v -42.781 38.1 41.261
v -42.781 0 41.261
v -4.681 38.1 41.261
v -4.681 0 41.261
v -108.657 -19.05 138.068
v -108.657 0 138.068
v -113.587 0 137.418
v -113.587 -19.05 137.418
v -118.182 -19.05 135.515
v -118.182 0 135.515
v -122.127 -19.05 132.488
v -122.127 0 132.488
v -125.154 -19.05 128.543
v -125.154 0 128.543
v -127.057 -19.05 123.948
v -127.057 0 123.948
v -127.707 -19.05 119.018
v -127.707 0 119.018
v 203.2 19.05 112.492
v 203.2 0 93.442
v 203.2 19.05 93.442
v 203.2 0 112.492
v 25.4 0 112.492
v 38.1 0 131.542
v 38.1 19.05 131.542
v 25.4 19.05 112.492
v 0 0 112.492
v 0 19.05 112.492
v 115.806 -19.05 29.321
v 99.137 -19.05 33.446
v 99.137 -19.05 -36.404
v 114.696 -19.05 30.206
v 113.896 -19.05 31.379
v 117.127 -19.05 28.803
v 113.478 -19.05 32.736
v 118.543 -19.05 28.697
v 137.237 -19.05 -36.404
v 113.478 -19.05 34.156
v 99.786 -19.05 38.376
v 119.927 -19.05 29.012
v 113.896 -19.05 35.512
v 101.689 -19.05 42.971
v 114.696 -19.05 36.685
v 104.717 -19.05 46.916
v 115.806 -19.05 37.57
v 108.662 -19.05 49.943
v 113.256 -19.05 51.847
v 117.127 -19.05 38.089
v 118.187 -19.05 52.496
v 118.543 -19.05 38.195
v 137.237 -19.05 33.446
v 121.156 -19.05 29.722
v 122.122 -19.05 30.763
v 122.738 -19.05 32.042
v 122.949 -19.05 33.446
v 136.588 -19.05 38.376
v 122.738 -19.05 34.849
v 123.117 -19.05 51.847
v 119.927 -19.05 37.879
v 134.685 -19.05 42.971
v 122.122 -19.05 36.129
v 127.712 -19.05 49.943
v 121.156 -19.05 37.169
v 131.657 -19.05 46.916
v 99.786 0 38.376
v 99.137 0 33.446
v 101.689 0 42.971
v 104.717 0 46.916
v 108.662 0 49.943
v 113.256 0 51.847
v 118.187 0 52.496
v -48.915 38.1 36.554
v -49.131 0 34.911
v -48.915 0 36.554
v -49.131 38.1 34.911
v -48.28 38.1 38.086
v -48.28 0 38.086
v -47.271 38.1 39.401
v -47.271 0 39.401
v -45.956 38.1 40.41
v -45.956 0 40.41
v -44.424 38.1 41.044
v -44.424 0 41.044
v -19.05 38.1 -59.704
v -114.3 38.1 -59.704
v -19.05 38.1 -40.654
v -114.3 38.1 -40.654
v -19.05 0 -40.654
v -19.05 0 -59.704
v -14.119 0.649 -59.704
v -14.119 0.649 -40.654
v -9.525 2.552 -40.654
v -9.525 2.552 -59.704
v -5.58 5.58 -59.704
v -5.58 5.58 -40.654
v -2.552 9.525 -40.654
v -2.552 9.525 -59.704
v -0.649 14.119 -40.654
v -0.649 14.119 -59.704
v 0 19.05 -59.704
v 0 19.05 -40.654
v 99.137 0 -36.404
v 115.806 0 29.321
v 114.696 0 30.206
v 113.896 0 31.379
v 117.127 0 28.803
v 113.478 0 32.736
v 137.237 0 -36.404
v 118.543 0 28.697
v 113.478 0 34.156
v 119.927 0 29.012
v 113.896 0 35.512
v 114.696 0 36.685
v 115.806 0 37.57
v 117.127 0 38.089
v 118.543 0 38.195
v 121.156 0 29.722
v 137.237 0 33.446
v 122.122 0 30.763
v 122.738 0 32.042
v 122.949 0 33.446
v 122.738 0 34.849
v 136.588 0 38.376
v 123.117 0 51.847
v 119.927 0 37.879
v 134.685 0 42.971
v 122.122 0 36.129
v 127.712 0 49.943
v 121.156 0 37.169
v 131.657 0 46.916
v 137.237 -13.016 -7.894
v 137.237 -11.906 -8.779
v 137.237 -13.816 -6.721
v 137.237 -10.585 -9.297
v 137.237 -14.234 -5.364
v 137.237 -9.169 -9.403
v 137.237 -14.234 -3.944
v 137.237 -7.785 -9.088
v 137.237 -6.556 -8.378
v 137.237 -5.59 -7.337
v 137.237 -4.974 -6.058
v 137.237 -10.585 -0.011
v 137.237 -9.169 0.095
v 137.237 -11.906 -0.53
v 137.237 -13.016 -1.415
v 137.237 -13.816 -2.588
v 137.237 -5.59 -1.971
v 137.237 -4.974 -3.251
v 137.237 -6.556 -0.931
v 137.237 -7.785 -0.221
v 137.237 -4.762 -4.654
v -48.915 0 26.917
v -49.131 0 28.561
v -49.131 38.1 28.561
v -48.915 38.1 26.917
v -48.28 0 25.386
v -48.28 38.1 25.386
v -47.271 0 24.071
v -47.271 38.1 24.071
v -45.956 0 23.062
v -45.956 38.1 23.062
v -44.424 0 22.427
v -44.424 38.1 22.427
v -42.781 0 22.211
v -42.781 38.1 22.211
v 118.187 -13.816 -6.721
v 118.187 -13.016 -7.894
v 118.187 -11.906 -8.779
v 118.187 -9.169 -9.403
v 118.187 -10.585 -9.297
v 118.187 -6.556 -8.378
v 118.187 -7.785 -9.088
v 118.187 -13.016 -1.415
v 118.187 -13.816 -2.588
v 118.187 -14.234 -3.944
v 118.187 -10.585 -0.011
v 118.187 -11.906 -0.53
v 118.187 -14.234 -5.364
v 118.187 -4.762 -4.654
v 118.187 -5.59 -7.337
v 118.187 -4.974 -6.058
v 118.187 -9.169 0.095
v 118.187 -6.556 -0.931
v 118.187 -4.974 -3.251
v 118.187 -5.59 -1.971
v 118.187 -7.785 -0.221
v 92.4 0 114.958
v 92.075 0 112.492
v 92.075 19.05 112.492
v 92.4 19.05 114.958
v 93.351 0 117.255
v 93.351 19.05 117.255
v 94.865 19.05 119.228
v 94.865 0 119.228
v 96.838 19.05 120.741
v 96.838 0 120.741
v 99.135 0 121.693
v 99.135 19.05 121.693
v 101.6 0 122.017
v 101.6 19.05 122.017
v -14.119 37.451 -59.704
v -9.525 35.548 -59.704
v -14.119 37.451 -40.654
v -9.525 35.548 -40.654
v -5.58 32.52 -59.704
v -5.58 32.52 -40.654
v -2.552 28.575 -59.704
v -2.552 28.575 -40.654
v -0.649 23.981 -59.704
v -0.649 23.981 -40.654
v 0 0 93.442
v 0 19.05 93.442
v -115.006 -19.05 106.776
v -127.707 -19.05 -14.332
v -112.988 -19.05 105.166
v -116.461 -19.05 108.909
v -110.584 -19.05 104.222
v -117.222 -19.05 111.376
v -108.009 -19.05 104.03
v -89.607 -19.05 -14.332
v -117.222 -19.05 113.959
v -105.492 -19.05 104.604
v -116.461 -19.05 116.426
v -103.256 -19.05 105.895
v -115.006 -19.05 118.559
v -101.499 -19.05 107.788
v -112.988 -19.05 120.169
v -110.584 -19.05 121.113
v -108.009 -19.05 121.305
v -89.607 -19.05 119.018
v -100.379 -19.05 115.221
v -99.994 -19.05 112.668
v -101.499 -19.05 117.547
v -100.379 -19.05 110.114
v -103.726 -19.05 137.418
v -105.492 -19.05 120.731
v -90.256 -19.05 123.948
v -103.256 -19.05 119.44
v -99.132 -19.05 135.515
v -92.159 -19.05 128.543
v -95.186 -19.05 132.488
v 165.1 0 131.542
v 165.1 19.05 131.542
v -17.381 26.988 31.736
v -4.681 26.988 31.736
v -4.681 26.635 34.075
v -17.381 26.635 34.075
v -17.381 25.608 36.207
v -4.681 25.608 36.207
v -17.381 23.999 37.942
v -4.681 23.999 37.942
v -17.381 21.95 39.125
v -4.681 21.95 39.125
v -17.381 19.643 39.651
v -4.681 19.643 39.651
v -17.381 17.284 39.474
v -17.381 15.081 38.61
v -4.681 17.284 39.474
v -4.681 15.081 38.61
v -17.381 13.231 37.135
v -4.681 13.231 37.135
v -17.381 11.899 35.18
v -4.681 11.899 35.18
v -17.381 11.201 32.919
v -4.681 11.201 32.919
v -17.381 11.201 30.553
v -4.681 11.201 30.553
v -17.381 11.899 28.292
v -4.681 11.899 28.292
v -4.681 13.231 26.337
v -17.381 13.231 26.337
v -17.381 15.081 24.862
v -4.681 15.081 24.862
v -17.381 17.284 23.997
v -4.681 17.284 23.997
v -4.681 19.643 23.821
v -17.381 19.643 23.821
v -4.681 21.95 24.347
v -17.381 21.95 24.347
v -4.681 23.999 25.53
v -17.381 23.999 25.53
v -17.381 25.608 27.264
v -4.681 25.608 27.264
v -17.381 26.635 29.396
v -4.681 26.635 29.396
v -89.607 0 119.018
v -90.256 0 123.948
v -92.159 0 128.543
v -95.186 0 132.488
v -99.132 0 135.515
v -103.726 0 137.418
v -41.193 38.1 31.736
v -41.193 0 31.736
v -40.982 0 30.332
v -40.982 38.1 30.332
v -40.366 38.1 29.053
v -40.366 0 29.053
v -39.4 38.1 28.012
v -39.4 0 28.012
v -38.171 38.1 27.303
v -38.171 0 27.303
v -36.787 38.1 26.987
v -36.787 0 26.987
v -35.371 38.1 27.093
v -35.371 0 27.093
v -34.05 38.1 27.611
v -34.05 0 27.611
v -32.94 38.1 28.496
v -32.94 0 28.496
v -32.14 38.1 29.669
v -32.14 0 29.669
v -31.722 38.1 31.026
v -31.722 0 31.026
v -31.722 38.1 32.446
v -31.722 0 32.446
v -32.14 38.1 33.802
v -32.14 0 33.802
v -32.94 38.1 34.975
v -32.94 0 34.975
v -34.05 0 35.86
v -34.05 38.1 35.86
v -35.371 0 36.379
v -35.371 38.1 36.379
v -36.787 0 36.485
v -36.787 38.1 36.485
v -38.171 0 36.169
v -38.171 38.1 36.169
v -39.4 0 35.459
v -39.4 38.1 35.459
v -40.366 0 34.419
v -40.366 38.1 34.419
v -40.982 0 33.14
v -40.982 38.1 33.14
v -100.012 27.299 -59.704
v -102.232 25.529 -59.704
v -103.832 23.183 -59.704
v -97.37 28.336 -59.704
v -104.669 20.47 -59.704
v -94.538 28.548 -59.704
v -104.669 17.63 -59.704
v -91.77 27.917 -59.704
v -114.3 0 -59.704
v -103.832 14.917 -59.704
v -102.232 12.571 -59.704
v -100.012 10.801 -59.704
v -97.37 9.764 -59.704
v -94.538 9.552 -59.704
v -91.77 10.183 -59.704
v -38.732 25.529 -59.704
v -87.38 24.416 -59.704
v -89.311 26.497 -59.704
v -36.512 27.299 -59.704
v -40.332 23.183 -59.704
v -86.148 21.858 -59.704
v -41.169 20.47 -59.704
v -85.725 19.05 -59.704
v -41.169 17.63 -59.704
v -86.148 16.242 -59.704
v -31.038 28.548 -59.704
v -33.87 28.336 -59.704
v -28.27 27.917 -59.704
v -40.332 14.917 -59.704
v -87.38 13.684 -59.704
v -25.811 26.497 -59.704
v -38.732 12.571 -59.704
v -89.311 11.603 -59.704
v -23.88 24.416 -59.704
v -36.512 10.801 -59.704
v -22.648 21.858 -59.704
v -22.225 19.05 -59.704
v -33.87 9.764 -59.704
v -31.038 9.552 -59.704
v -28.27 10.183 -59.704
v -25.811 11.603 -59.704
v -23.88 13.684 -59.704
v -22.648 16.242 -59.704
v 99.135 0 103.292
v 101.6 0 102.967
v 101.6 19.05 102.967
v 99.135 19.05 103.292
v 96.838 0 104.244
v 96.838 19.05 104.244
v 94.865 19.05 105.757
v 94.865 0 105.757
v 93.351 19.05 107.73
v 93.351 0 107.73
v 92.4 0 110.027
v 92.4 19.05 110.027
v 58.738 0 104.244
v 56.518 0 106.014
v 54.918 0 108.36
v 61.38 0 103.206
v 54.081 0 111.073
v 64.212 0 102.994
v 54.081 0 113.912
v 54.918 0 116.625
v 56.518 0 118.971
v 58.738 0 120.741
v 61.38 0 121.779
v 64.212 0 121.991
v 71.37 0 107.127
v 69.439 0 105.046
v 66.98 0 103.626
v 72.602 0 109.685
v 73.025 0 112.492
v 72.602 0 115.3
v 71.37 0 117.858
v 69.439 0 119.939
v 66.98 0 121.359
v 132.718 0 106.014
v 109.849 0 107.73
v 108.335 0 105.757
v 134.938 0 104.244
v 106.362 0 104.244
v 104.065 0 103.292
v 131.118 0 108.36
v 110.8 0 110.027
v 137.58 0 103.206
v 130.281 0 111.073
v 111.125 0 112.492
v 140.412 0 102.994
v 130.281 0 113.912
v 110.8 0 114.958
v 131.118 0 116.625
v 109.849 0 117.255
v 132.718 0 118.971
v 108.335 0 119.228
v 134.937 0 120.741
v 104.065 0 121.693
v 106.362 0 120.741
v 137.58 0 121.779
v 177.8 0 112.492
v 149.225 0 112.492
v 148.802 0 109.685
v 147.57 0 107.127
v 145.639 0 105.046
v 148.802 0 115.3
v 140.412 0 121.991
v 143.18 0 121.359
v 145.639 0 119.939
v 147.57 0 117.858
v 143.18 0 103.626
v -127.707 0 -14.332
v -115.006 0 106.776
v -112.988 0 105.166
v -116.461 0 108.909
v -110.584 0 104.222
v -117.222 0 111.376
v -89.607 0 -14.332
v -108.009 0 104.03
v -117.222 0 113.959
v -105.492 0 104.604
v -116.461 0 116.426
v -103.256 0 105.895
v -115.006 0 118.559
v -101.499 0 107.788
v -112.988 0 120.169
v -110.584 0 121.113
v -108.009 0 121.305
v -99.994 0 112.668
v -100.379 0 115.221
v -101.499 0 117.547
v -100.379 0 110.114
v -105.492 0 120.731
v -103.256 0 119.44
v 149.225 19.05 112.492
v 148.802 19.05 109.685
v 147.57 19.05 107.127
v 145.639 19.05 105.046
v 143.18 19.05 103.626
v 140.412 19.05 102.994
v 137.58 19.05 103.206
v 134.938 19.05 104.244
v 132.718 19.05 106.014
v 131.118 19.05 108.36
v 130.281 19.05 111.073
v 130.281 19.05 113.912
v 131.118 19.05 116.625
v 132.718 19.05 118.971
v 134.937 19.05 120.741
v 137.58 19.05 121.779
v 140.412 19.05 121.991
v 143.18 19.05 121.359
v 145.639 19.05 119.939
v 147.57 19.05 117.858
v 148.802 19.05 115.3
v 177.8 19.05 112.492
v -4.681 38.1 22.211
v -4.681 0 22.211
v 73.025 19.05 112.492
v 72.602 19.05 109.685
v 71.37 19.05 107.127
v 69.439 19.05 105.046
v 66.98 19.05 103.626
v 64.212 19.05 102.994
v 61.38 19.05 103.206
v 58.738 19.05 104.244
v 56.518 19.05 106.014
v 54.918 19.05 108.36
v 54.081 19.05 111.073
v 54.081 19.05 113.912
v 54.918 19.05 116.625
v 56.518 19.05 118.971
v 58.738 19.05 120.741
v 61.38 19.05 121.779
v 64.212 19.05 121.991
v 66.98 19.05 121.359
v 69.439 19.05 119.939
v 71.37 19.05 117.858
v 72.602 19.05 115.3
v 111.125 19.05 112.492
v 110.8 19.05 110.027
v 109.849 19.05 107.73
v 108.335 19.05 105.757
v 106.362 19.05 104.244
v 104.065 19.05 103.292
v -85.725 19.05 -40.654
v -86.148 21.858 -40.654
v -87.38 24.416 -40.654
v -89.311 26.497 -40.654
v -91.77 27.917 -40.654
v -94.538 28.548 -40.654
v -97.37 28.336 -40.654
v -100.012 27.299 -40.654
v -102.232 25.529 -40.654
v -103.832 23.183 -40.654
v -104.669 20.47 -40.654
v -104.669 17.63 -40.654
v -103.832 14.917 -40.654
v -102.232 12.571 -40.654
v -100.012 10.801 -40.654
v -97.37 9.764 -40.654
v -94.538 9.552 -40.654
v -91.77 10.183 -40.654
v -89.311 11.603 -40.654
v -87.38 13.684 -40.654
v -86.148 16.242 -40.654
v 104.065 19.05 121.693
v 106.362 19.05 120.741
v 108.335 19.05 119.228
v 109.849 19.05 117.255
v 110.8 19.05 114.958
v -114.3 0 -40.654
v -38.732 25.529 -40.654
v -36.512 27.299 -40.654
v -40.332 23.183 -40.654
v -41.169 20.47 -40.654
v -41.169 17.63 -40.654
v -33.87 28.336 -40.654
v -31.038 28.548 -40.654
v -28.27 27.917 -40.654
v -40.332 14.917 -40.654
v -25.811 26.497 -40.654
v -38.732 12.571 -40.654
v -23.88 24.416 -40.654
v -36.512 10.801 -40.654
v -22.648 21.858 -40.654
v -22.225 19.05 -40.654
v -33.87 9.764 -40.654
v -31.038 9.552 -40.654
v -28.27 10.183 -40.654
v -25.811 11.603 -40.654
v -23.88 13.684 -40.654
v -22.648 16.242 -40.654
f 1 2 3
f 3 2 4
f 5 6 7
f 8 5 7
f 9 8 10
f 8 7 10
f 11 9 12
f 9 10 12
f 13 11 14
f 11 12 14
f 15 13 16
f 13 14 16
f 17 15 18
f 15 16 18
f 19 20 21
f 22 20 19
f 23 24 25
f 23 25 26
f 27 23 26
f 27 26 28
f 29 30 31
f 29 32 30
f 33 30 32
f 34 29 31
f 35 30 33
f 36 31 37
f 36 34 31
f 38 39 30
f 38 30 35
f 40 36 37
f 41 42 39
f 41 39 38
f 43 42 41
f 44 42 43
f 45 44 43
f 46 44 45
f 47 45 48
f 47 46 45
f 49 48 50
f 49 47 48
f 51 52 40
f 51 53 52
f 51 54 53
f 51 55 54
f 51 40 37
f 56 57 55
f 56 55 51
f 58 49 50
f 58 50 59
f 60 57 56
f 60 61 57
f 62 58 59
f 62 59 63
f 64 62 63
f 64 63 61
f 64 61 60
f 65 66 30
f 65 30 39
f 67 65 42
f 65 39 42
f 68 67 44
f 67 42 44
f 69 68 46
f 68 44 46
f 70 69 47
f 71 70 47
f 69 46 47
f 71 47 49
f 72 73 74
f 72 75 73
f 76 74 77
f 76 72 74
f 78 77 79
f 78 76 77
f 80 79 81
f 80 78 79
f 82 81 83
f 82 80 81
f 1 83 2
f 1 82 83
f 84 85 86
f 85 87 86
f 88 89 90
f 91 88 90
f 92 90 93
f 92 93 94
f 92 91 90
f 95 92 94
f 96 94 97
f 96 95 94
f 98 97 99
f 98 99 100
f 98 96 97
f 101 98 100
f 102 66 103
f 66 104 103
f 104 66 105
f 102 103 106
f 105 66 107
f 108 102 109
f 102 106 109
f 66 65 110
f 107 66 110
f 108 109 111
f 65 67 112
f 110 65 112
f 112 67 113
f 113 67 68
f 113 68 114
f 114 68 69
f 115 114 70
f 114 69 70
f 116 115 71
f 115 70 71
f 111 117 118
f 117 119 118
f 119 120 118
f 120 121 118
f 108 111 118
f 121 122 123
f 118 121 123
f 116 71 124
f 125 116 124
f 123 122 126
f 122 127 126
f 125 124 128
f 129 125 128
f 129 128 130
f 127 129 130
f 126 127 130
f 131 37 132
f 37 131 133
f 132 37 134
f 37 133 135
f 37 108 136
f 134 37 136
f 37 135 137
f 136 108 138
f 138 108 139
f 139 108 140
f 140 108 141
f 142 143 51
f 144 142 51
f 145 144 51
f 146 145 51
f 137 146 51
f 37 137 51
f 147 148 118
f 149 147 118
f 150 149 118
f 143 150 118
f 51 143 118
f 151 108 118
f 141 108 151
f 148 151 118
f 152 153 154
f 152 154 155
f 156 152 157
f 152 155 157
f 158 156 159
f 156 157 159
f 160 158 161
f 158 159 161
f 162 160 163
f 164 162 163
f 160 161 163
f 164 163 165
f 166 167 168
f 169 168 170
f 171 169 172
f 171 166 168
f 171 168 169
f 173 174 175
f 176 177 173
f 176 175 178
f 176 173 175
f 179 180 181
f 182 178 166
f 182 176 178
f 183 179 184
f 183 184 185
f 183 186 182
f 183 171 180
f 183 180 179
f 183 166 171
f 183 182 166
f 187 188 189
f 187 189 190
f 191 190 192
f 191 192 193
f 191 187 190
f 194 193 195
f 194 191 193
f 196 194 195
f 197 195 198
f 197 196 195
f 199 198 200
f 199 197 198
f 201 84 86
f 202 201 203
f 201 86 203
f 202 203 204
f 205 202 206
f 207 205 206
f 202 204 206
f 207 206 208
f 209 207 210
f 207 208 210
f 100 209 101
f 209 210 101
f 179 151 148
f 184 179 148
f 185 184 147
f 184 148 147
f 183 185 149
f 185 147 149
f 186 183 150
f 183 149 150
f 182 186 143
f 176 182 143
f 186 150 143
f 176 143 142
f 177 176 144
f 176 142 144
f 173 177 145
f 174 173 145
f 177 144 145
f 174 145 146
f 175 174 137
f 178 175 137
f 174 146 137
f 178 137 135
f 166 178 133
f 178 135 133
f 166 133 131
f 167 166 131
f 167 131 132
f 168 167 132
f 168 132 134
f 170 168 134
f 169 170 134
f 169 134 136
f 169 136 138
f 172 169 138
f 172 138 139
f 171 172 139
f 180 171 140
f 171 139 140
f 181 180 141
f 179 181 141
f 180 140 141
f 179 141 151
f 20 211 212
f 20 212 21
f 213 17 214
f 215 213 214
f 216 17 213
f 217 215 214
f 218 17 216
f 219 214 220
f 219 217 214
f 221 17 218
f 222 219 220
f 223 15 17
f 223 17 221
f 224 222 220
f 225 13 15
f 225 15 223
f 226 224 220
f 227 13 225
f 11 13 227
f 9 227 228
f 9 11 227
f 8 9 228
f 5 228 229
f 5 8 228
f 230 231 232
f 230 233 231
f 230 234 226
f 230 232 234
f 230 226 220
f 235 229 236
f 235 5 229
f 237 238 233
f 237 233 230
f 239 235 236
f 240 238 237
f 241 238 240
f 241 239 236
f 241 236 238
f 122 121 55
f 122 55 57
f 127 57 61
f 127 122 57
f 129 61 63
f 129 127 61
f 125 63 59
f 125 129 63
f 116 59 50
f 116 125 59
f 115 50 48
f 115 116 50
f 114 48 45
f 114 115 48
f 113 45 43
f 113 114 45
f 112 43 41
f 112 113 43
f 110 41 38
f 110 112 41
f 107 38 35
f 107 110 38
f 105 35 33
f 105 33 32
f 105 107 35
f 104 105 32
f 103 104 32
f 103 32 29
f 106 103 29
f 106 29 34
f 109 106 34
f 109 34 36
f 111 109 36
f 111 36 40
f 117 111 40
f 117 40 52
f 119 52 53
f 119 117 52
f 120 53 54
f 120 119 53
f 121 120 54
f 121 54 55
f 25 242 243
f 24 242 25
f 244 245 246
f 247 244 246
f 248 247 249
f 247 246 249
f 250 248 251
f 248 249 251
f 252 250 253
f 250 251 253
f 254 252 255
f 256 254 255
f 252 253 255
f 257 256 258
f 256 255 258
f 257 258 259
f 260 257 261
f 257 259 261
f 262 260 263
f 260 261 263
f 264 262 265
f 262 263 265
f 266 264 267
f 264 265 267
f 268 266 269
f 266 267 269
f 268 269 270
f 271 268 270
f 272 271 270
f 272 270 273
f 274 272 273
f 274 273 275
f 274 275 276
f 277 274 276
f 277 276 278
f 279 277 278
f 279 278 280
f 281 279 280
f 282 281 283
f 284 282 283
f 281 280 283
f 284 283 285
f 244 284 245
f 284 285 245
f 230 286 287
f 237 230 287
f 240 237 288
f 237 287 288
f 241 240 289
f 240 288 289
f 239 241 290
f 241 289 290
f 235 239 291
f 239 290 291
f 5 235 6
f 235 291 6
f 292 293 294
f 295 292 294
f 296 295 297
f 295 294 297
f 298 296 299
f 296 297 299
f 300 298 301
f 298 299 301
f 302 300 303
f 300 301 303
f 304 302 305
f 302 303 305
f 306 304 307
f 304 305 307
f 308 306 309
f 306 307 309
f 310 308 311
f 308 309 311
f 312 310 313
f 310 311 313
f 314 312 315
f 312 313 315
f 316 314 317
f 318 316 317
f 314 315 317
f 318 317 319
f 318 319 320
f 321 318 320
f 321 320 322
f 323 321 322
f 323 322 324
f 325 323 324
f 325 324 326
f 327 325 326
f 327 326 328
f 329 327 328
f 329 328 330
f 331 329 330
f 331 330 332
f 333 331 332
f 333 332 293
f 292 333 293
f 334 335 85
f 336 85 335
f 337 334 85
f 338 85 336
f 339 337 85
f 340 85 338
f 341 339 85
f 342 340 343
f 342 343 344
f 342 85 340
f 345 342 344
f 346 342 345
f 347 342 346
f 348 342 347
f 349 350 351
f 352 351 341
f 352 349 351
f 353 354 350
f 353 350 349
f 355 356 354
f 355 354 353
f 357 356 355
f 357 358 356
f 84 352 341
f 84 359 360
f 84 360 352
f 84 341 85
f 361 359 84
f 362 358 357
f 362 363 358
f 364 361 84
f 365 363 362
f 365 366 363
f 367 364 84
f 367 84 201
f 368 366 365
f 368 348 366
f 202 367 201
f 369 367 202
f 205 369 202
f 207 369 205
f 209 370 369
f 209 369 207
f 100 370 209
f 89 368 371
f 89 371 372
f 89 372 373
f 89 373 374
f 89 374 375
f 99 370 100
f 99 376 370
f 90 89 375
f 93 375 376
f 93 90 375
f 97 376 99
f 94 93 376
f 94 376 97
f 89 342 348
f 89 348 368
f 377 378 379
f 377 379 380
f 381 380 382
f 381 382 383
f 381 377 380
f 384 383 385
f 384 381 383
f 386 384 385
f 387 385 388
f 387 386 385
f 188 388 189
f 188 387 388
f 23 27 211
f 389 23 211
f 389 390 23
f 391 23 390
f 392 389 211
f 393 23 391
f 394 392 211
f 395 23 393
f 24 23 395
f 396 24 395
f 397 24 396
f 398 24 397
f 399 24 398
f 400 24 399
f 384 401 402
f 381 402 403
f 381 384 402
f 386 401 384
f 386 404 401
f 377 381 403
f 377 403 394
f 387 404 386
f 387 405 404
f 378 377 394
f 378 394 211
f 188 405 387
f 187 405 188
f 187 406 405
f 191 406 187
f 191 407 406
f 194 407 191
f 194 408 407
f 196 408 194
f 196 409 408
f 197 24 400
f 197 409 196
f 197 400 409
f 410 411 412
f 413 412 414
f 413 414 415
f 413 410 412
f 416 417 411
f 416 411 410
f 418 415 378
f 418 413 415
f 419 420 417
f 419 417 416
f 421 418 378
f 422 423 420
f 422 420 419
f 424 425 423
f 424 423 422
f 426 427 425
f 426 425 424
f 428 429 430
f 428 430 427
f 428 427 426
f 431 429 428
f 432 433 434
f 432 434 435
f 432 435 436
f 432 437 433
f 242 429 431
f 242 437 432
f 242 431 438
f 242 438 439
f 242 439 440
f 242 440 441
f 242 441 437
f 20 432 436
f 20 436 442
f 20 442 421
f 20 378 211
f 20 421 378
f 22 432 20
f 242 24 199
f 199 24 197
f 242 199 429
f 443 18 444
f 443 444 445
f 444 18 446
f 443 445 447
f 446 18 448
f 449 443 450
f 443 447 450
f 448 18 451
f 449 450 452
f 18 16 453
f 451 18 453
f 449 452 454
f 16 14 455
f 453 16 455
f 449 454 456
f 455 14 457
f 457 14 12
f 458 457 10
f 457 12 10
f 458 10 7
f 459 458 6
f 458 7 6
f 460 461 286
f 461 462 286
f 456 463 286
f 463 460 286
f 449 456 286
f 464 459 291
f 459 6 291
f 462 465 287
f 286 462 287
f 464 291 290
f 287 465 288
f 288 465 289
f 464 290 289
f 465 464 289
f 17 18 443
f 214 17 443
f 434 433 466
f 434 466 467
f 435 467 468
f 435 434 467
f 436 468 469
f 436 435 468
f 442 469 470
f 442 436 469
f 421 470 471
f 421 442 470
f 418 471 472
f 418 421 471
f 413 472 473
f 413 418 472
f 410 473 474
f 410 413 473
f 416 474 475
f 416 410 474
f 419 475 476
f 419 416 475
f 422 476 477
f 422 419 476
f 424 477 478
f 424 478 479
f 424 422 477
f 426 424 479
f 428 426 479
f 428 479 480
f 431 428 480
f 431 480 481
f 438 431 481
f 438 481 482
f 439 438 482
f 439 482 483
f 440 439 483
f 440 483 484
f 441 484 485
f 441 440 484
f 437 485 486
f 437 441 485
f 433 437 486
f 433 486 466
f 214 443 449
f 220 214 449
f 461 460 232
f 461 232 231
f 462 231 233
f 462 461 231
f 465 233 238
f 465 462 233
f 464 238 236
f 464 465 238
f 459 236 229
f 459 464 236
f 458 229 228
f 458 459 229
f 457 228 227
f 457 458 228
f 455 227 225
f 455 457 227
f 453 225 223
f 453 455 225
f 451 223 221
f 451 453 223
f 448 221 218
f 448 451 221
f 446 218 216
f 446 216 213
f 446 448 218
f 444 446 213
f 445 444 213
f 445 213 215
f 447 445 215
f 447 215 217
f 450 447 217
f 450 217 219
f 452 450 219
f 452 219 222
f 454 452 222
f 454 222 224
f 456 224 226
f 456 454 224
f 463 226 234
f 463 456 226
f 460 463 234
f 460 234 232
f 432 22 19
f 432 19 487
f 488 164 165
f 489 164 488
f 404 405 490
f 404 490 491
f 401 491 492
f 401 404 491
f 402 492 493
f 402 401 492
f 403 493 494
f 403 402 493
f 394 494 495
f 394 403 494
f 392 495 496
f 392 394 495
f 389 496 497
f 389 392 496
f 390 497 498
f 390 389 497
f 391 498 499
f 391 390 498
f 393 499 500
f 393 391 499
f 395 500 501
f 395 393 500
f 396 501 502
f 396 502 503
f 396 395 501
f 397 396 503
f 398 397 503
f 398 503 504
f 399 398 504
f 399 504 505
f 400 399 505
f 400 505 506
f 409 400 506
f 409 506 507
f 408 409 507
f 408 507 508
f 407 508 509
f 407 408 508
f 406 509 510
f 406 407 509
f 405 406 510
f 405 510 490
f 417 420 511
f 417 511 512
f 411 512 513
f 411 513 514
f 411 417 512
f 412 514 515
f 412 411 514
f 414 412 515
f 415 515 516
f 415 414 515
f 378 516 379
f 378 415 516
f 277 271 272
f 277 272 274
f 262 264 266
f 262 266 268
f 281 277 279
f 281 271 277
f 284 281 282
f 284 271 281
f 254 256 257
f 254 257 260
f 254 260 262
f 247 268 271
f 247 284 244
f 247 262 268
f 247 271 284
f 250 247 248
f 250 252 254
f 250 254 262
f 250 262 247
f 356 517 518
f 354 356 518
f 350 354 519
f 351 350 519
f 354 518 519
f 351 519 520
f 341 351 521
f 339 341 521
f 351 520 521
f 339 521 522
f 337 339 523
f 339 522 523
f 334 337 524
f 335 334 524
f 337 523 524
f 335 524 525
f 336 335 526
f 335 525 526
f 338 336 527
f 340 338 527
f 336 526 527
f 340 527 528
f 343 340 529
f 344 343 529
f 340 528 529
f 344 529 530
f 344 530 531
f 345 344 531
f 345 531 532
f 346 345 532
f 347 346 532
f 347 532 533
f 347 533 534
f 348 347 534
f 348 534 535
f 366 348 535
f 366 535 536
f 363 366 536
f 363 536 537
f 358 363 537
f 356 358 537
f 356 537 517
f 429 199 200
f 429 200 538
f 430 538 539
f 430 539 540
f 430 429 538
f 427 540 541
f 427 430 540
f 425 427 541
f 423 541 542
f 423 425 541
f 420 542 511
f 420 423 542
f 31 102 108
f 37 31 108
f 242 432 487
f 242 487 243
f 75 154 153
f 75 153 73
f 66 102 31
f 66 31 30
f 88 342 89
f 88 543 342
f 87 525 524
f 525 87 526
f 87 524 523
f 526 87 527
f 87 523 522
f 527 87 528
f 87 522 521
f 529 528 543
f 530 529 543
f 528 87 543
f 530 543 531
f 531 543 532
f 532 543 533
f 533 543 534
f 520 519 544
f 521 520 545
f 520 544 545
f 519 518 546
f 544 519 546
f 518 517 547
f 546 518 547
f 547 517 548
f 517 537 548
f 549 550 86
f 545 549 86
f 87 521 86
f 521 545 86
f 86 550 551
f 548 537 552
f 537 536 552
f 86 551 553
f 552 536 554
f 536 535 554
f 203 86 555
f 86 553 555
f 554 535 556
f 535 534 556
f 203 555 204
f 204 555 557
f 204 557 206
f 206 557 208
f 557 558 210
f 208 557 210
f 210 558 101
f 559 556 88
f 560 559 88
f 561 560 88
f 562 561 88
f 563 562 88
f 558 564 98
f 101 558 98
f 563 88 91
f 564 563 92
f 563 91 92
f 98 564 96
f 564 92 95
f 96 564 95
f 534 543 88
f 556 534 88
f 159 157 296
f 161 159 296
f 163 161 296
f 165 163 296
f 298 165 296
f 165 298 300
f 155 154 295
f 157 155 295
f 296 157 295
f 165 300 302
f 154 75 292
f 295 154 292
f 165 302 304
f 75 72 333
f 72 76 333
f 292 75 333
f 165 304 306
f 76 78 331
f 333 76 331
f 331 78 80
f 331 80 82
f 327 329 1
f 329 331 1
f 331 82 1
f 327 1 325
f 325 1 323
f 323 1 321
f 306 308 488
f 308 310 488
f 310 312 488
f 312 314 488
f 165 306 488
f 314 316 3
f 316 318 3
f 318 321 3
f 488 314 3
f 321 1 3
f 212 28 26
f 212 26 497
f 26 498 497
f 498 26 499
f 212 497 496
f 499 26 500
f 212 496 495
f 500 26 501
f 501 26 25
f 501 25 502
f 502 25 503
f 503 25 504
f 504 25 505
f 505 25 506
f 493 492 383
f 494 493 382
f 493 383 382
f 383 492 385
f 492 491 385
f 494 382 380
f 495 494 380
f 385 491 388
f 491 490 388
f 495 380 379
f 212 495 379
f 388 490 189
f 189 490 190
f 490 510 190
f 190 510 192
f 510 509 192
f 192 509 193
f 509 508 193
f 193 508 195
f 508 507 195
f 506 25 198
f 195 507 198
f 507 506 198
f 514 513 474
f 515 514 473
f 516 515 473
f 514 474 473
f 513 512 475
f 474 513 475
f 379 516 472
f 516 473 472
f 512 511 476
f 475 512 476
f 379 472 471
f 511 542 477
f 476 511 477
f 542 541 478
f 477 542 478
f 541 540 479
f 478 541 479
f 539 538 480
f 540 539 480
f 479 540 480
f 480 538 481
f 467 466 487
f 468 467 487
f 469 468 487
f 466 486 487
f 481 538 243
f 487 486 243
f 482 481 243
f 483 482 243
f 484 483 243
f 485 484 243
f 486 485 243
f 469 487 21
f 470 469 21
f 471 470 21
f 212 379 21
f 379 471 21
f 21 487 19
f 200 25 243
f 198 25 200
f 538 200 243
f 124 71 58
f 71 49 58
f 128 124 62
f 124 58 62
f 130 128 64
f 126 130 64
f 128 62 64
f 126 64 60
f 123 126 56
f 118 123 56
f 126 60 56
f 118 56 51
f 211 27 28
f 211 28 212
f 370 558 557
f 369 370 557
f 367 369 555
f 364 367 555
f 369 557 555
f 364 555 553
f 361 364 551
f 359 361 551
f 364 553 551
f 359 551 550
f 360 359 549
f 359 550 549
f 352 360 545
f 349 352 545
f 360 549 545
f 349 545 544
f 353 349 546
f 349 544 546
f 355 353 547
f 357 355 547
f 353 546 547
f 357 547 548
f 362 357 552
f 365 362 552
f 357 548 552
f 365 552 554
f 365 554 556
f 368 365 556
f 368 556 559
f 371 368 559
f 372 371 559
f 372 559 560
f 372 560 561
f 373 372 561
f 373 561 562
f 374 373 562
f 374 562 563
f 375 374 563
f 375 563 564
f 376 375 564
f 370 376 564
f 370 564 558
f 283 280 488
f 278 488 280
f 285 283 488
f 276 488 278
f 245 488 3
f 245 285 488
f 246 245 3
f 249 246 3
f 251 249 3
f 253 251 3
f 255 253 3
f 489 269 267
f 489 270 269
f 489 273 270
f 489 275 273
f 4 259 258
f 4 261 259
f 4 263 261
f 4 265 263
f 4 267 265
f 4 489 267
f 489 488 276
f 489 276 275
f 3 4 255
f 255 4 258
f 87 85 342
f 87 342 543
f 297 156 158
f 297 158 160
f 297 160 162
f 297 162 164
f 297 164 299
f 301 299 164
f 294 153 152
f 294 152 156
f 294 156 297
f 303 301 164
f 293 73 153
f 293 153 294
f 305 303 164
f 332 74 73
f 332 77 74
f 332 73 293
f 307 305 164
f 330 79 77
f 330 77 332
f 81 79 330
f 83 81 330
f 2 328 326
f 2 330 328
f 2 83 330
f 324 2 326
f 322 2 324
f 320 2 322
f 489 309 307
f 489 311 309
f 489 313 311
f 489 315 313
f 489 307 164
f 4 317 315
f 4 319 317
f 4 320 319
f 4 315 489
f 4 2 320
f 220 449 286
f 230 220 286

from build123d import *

# Parameters (mm, degrees)
F0_W      = 44.45
F0_H      = 19.05
F1_DEPTH  = 38.1
F3_DEPTH  = 43.18
F4_R      = 7.9375
F5_DEPTH  = 12.7
F6_R      = 6.35
F7_W      = 38.1
F7_H      = 88.9
F7_R      = 4.7625
F8_DEPTH  = 19.05
F9_R      = 4.7625
F10_DEPTH = 19.05
F11_R     = 19.04999
F12_W     = 114.3
F12_H     = 19.05
F13_DEPTH = 38.1
F14_R     = 9.525
F15_DEPTH = 101.6
F16_R     = 19.04999
F17_R     = 8.6622092444
F18_DEPTH = 19.05
F20_DEPTH = 19.05


# Not quite as in the source:
# - a fillet or chamfer is up to 0.001 mm smaller than in the source, because OpenCascade refuses the exact size


with BuildPart() as f1:
    # F0 (on Front) → F1 (new body)
    with BuildSketch(Plane.XZ):
        with Locations((-26.9059087763, 31.7358085886)):
            Rectangle(F0_W, F0_H)
    extrude(amount=-F1_DEPTH)

    # F2 (on face) → F3 (cut)
    with BuildSketch(Plane.XZ):
        with BuildLine():
            ThreePointArc((-31.6684087763, 31.7358085886), (-36.4309087763, 36.4983085886), (-41.1934087763, 31.7358085886))
            Line((-41.1934087763, 31.7358085886), (-31.6684087763, 31.7358085886))
        make_face()
        with BuildLine():
            Line((-31.6684087763, 31.7358085886), (-41.1934087763, 31.7358085886))
            ThreePointArc((-41.1934087763, 31.7358085886), (-36.4309087763, 26.9733085886), (-31.6684087763, 31.7358085886))
        make_face()
    extrude(amount=-F3_DEPTH, mode=Mode.SUBTRACT)

    # F4 (on face) → F5 (cut)
    with BuildSketch(Plane.YZ.offset(-4.6809087763)):
        with Locations((19.05, 31.7358085886)):
            Circle(F4_R)
    extrude(amount=-F5_DEPTH, mode=Mode.SUBTRACT)

    # F6
    f6_edges = [f1.edges().sort_by_distance(p)[0] for p in [
        (-49.130909, 19.05, 41.260809),
        (-49.130909, 19.05, 22.210809),
    ]]
    fillet(f6_edges, radius=F6_R)


with BuildPart() as f8:
    # F7 (on Front) → F8 (new body)
    with BuildSketch(Plane.XZ):
        with Locations((118.1868945239, 8.0456975847)):
            Rectangle(F7_W, F7_H)
        with Locations((118.1868945239, 33.4456975847)):
            Circle(F7_R, mode=Mode.SUBTRACT)
    extrude(amount=F8_DEPTH)

    # F9 (on face) → F10 (cut)
    with BuildSketch(Plane.YZ.offset(137.2368945239)):
        with Locations((-9.525, -4.6543024153)):
            Circle(F9_R)
    extrude(amount=-F10_DEPTH, mode=Mode.SUBTRACT)

    # F11 (radius 19.05 in the source; OpenCascade refuses exactly that, so slightly less here)
    f11_edges = [f8.edges().sort_by_distance(p)[0] for p in [
        (137.236895, -9.525, 52.495698),
        (99.136895, -9.525, 52.495698),
    ]]
    fillet(f11_edges, radius=F11_R)


with BuildPart() as f13:
    # F12 (on Front) → F13 (new body)
    with BuildSketch(Plane.XZ):
        with Locations((-57.15, -50.1792910555)):
            Rectangle(F12_W, F12_H)
    extrude(amount=-F13_DEPTH)

    # F14 (on face) → F15 (cut)
    with BuildSketch(Plane.XY.offset(-40.6542910555)):
        with Locations((-95.25, 19.05)):
            Circle(F14_R)
        with Locations((-31.75, 19.05)):
            Circle(F14_R)
    extrude(amount=-F15_DEPTH, mode=Mode.SUBTRACT)

    # F16 (radius 19.05 in the source; OpenCascade refuses exactly that, so slightly less here)
    f16_edges = [f13.edges().sort_by_distance(p)[0] for p in [
        (0, 38.1, -50.179291),
        (0, 0, -50.179291),
    ]]
    fillet(f16_edges, radius=F16_R)


with BuildPart() as f18:
    # F17 (on Front) → F18 (new body)
    with BuildSketch(Plane.XZ):
        with BuildLine():
            Line((-127.7065266967, 119.0175100861), (-127.7065266967, -14.3324899139))
            Line((-127.7065266967, -14.3324899139), (-89.6065266967, -14.3324899139))
            Line((-89.6065266967, -14.3324899139), (-89.6065266967, 119.0175100861))
            ThreePointArc((-89.6065266967, 119.0175100861), (-95.1861425151, 132.4878942677), (-108.6565266967, 138.0675100861))
            ThreePointArc((-108.6565266967, 138.0675100861), (-122.1269108783, 132.4878942677), (-127.7065266967, 119.0175100861))
        make_face()
        with Locations((-108.6565266967, 112.6675100861)):
            Circle(F17_R, mode=Mode.SUBTRACT)
    extrude(amount=F18_DEPTH)


with BuildPart() as f20:
    # F19 (on Front) → F20 (new body)
    with BuildSketch(Plane.XZ):
        with BuildLine():
            Line((101.6, 131.5424591149), (38.1, 131.5424591149))
            Line((38.1, 131.5424591149), (25.4, 112.4924591149))
            Line((25.4, 112.4924591149), (53.975, 112.4924591149))
            ThreePointArc((53.975, 112.4924591149), (63.5, 122.0174591149), (73.025, 112.4924591149))
            Line((73.025, 112.4924591149), (92.075, 112.4924591149))
            ThreePointArc((92.075, 112.4924591149), (94.8648079092, 119.2276512057), (101.6, 122.0174591149))
            Line((101.6, 122.0174591149), (101.6, 131.5424591149))
        make_face()
        with BuildLine():
            Line((165.1, 131.5424591149), (101.6, 131.5424591149))
            Line((101.6, 131.5424591149), (101.6, 122.0174591149))
            ThreePointArc((101.6, 122.0174591149), (108.3351920908, 119.2276512057), (111.125, 112.4924591149))
            Line((111.125, 112.4924591149), (130.175, 112.4924591149))
            ThreePointArc((130.175, 112.4924591149), (139.7, 122.0174591149), (149.225, 112.4924591149))
            Line((149.225, 112.4924591149), (177.8, 112.4924591149))
            Line((177.8, 112.4924591149), (165.1, 131.5424591149))
        make_face()
        with BuildLine():
            Line((53.975, 112.4924591149), (25.4, 112.4924591149))
            Line((25.4, 112.4924591149), (0, 112.4924591149))
            Line((0, 112.4924591149), (0, 93.4424591149))
            Line((0, 93.4424591149), (101.6, 93.4424591149))
            Line((101.6, 93.4424591149), (101.6, 102.9674591149))
            ThreePointArc((101.6, 102.9674591149), (94.8648079092, 105.7572670241), (92.075, 112.4924591149))
            Line((92.075, 112.4924591149), (73.025, 112.4924591149))
            ThreePointArc((73.025, 112.4924591149), (63.5, 102.9674591149), (53.975, 112.4924591149))
        make_face()
        with BuildLine():
            Line((203.2, 112.4924591149), (177.8, 112.4924591149))
            Line((177.8, 112.4924591149), (149.225, 112.4924591149))
            ThreePointArc((149.225, 112.4924591149), (139.7, 102.9674591149), (130.175, 112.4924591149))
            Line((130.175, 112.4924591149), (111.125, 112.4924591149))
            ThreePointArc((111.125, 112.4924591149), (108.3351920908, 105.7572670241), (101.6, 102.9674591149))
            Line((101.6, 102.9674591149), (101.6, 93.4424591149))
            Line((101.6, 93.4424591149), (203.2, 93.4424591149))
            Line((203.2, 93.4424591149), (203.2, 112.4924591149))
        make_face()
    extrude(amount=-F20_DEPTH)


solid = Compound([f1.part, f8.part, f13.part, f18.part, f20.part])
